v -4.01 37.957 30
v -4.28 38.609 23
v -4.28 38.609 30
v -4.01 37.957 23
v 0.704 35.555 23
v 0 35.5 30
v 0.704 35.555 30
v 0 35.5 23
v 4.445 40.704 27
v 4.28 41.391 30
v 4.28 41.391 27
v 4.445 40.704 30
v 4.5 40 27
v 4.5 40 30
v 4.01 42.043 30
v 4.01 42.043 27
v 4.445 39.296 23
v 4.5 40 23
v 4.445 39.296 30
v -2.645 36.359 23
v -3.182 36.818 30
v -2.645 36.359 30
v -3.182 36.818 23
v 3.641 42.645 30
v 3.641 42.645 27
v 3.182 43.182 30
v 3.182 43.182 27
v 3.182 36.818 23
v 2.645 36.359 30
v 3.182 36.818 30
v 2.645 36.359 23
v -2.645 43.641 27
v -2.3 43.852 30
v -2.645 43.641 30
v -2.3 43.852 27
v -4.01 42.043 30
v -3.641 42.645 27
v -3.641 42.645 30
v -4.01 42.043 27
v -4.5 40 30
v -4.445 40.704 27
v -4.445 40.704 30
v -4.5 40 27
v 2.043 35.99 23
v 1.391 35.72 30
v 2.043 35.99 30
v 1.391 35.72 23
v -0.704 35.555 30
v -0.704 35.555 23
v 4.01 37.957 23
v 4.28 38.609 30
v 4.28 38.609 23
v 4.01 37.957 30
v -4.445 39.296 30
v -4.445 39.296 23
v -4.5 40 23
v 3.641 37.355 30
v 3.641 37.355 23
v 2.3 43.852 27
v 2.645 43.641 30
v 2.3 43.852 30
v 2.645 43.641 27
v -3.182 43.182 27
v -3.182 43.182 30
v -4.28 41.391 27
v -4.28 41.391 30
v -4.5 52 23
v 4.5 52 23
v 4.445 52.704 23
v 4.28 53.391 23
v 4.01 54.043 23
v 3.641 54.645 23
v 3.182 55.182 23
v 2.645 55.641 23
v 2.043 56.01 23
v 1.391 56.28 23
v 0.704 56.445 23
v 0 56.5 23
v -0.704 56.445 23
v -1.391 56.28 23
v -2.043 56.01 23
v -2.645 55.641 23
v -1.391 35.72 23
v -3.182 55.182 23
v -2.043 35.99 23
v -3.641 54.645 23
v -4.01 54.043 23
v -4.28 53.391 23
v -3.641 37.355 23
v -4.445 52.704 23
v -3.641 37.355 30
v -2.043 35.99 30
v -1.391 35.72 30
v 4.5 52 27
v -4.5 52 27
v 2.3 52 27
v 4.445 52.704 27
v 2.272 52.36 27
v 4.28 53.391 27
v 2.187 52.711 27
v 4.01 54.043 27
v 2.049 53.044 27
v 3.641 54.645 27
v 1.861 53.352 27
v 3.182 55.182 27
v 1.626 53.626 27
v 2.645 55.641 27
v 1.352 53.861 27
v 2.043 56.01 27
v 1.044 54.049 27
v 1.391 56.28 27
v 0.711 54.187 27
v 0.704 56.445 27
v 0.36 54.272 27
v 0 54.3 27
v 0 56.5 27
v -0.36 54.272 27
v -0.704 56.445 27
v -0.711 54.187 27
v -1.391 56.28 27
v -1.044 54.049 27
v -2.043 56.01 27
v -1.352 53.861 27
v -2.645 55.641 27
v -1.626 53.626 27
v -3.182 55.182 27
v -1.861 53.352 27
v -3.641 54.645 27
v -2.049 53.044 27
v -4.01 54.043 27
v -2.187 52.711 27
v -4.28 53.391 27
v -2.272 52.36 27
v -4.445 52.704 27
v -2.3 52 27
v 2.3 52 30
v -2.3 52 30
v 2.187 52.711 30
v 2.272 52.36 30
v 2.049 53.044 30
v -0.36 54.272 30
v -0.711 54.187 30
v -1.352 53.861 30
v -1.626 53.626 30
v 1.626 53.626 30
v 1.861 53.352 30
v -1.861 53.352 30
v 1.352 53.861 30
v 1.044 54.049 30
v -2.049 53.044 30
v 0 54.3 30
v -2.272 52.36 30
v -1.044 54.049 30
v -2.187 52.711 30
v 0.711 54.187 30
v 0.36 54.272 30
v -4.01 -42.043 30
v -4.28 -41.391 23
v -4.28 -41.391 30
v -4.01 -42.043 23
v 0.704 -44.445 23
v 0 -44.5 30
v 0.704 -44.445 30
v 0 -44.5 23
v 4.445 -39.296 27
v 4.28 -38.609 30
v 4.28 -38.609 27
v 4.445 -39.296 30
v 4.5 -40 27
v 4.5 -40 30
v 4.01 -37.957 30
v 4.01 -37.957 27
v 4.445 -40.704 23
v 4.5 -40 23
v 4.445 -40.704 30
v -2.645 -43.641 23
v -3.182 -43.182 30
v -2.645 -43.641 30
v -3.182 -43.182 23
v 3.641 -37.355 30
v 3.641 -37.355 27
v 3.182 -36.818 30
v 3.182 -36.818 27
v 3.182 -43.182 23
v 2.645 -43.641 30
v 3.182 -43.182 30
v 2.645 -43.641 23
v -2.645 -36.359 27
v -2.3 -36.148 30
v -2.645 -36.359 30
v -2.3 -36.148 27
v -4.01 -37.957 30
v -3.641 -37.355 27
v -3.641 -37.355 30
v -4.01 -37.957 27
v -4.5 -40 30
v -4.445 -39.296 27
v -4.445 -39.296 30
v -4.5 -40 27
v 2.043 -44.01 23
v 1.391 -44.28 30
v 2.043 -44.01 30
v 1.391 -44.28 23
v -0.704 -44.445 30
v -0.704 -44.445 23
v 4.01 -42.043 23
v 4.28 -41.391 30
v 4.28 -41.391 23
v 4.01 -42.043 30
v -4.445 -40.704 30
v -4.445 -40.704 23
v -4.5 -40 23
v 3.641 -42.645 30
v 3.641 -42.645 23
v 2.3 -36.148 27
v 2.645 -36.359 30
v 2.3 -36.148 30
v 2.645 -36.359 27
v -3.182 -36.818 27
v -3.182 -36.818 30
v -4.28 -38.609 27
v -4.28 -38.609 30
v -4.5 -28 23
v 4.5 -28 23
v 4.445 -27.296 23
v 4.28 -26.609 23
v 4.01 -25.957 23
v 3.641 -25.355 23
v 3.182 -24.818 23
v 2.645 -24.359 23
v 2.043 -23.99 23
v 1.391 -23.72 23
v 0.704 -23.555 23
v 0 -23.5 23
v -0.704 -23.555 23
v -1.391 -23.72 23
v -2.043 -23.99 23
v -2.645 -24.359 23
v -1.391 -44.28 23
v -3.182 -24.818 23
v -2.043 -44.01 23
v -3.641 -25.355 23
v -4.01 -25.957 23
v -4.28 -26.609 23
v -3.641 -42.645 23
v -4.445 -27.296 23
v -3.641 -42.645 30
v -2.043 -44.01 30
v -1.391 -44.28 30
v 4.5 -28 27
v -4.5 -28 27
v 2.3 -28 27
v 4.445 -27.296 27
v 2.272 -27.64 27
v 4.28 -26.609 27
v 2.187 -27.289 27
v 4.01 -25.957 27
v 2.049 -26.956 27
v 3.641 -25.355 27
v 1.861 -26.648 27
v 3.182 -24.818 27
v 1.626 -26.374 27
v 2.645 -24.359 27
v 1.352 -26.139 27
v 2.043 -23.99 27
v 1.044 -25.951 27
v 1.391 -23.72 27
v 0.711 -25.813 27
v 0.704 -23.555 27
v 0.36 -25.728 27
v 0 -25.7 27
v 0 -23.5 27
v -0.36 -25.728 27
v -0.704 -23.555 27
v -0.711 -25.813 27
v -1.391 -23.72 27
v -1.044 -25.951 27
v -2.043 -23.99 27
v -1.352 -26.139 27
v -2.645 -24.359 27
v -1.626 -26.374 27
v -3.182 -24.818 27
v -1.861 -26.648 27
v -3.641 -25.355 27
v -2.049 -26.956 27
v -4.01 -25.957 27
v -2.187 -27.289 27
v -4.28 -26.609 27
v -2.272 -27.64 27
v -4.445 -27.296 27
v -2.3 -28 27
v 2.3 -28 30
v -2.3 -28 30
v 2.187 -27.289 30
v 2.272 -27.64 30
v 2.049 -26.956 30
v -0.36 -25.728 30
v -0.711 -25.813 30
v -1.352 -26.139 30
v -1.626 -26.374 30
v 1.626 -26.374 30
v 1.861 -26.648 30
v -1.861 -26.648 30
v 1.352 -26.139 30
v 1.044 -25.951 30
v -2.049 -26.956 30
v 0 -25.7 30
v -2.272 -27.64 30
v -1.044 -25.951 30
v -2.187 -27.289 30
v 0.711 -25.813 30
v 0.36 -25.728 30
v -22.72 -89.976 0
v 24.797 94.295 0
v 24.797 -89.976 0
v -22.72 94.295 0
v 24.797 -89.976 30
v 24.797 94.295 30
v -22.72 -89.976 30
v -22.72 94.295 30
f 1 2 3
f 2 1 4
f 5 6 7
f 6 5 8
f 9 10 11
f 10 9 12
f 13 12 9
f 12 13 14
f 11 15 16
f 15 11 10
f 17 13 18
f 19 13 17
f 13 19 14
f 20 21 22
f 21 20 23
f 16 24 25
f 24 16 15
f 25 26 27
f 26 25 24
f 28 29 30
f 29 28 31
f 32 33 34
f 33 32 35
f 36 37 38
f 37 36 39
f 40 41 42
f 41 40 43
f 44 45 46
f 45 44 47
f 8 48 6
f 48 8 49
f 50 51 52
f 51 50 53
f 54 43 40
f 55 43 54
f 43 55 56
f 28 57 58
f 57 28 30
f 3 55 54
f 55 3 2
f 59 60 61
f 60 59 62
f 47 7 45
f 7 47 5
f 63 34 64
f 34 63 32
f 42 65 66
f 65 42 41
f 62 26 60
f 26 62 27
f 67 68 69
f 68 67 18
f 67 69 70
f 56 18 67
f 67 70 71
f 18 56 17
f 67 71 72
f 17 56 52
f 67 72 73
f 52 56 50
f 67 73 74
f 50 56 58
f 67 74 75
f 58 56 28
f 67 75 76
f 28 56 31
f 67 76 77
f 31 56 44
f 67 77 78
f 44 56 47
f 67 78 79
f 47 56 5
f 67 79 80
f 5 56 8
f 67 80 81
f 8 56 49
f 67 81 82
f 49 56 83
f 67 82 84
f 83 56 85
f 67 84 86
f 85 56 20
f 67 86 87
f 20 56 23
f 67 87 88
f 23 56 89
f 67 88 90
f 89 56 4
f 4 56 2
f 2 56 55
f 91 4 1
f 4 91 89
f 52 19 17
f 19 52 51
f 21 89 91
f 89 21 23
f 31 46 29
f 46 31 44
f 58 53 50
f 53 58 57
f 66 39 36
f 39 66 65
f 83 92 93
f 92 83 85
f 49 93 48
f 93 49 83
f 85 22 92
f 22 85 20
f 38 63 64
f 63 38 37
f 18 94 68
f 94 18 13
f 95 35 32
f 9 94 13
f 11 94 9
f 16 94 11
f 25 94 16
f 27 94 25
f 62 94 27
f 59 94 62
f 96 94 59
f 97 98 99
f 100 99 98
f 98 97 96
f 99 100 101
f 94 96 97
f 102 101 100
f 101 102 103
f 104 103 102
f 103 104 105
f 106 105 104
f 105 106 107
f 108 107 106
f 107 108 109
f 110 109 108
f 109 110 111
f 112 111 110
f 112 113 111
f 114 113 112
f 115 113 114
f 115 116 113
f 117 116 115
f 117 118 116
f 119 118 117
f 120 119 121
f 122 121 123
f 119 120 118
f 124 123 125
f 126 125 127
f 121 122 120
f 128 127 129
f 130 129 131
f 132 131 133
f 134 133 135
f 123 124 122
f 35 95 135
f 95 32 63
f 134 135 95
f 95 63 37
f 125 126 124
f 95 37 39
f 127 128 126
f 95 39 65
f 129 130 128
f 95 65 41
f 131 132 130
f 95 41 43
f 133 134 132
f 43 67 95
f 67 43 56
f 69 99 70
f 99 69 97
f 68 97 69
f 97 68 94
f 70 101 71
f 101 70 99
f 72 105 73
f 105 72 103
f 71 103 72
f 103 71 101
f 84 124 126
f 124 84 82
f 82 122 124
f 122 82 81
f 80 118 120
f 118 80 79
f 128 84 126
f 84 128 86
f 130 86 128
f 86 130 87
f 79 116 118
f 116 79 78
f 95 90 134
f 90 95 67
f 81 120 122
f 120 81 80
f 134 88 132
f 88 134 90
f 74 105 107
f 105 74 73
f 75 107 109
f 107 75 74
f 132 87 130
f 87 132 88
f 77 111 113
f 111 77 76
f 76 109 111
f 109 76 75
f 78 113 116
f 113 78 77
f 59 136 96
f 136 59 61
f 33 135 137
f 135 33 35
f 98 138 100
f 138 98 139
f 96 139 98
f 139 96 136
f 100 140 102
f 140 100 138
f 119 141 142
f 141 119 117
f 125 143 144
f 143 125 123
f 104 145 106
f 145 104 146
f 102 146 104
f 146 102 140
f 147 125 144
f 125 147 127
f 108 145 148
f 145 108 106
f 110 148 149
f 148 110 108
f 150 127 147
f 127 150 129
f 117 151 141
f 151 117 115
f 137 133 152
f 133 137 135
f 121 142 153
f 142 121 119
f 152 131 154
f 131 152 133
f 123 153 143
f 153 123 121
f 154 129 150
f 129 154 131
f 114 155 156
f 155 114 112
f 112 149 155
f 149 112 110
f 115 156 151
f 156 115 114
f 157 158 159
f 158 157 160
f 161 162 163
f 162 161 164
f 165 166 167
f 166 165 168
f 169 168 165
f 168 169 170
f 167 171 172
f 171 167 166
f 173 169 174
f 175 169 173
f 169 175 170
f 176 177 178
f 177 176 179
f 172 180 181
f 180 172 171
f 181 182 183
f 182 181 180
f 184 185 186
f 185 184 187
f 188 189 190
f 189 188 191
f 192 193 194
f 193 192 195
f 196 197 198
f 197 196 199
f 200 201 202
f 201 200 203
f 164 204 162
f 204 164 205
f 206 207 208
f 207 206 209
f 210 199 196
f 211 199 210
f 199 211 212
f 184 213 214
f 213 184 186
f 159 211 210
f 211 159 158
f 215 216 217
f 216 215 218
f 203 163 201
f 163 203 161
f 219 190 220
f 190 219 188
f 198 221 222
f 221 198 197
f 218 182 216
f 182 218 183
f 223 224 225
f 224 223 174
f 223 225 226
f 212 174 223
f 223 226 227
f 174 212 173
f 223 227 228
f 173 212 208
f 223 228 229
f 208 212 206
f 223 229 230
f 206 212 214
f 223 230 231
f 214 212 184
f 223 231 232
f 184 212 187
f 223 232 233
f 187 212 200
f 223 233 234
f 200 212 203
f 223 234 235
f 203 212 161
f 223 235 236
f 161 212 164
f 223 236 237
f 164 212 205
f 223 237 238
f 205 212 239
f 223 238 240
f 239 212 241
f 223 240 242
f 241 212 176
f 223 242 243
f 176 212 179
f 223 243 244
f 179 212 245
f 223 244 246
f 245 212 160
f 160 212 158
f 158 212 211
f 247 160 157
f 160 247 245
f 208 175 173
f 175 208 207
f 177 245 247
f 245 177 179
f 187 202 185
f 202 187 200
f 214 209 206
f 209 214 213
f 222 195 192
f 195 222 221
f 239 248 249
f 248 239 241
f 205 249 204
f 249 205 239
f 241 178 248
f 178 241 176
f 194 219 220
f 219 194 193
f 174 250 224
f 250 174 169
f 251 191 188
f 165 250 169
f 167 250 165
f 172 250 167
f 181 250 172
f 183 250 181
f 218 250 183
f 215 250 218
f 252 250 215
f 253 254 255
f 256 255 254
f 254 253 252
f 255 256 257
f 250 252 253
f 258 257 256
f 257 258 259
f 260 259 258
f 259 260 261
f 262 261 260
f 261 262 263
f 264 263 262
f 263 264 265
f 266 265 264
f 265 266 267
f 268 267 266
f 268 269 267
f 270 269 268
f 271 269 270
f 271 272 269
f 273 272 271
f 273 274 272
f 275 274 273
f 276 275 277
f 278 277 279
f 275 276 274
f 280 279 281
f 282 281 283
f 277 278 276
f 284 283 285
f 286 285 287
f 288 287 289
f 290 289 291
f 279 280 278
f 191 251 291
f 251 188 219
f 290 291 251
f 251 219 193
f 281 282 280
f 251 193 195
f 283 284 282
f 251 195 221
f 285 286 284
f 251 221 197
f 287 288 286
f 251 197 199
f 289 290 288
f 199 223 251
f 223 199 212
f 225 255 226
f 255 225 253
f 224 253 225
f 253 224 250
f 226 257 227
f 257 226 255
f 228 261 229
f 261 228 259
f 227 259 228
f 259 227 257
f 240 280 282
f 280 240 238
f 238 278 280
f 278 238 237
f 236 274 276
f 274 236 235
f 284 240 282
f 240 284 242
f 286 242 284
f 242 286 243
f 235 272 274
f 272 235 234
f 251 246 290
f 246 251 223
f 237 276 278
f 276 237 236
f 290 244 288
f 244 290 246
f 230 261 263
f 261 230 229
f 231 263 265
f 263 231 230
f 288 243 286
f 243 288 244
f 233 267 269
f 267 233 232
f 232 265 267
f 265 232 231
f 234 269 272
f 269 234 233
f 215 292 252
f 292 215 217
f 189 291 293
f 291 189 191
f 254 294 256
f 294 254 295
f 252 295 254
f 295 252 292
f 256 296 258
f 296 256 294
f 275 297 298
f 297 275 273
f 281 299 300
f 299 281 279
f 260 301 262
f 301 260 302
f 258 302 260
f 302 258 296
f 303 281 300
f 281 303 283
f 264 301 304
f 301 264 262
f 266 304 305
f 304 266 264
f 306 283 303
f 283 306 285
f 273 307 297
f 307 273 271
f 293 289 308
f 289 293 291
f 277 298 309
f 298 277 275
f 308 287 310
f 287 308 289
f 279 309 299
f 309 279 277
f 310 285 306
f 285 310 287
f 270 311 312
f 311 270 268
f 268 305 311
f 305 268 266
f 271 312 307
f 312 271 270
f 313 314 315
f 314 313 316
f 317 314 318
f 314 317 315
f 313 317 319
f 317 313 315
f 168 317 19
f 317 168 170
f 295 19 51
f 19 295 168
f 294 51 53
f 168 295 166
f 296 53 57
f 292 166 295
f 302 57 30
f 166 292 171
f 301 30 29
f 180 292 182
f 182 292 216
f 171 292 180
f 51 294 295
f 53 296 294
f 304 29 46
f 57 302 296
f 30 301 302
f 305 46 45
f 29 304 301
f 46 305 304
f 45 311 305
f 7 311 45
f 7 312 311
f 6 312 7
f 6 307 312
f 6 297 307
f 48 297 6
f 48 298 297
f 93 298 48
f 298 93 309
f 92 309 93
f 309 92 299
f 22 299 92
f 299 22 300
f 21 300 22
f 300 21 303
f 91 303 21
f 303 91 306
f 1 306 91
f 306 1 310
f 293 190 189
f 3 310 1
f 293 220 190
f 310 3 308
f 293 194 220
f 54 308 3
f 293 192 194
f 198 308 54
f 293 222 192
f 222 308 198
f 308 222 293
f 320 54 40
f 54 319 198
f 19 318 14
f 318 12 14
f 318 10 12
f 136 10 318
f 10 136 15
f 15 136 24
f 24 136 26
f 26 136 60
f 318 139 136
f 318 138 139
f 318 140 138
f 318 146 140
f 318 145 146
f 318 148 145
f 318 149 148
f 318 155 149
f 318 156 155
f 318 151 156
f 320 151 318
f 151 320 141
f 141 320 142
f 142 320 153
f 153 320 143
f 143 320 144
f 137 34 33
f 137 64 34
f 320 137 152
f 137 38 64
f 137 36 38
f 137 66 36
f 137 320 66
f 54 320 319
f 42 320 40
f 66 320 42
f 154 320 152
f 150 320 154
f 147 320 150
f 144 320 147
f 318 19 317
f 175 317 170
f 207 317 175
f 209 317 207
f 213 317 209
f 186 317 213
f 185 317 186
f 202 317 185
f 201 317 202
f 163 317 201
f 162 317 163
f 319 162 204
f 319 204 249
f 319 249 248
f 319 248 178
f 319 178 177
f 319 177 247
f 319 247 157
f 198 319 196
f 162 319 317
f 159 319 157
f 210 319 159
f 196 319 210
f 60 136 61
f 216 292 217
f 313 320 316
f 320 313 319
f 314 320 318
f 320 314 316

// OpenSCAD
// Logotipo COW AI - Letra I (Relieve 30mm)
// Diseñado para impresión en Bambu Lab P1S (Cara frontal hacia abajo en cama PEI)


$fn = 40;

// Keyhole hanger pocket for wall mounting (face-down printing: rear is at z=depth)
module keyhole_pocket(depth = 30) {
    translate([0, 0, depth - 7]) {
        // Screw head insertion pocket (9mm dia, 7.2mm deep)
        cylinder(d = 9.0, h = 7.2);
        
        // Internal slide channel for screw head (9mm wide, 12mm high, 4mm deep)
        translate([-4.5, 0, 0]) cube([9.0, 12.0, 4.0]);
        translate([0, 12, 0]) cylinder(d = 9.0, h = 4.0);
        
        // Screw shank slot to the wall surface (4.6mm wide, 12mm high, 3.2mm deep)
        translate([-2.3, 0, 4.0]) cube([4.6, 12.0, 3.2]);
        translate([0, 12, 4.0]) cylinder(d = 4.6, h = 3.2);
    }
}


difference() {
    // Letra extruida 30mm
    linear_extrude(height = 30, convexity = 10)
        text("I", font = "Ubuntu:style=Bold", size = 182, halign = "center", valign = "center");
        
    // Alojamientos traseros para anclaje a pared
    translate([0, 40, 0]) keyhole_pocket(depth = 30);
    translate([0, -40, 0]) keyhole_pocket(depth = 30);
}
